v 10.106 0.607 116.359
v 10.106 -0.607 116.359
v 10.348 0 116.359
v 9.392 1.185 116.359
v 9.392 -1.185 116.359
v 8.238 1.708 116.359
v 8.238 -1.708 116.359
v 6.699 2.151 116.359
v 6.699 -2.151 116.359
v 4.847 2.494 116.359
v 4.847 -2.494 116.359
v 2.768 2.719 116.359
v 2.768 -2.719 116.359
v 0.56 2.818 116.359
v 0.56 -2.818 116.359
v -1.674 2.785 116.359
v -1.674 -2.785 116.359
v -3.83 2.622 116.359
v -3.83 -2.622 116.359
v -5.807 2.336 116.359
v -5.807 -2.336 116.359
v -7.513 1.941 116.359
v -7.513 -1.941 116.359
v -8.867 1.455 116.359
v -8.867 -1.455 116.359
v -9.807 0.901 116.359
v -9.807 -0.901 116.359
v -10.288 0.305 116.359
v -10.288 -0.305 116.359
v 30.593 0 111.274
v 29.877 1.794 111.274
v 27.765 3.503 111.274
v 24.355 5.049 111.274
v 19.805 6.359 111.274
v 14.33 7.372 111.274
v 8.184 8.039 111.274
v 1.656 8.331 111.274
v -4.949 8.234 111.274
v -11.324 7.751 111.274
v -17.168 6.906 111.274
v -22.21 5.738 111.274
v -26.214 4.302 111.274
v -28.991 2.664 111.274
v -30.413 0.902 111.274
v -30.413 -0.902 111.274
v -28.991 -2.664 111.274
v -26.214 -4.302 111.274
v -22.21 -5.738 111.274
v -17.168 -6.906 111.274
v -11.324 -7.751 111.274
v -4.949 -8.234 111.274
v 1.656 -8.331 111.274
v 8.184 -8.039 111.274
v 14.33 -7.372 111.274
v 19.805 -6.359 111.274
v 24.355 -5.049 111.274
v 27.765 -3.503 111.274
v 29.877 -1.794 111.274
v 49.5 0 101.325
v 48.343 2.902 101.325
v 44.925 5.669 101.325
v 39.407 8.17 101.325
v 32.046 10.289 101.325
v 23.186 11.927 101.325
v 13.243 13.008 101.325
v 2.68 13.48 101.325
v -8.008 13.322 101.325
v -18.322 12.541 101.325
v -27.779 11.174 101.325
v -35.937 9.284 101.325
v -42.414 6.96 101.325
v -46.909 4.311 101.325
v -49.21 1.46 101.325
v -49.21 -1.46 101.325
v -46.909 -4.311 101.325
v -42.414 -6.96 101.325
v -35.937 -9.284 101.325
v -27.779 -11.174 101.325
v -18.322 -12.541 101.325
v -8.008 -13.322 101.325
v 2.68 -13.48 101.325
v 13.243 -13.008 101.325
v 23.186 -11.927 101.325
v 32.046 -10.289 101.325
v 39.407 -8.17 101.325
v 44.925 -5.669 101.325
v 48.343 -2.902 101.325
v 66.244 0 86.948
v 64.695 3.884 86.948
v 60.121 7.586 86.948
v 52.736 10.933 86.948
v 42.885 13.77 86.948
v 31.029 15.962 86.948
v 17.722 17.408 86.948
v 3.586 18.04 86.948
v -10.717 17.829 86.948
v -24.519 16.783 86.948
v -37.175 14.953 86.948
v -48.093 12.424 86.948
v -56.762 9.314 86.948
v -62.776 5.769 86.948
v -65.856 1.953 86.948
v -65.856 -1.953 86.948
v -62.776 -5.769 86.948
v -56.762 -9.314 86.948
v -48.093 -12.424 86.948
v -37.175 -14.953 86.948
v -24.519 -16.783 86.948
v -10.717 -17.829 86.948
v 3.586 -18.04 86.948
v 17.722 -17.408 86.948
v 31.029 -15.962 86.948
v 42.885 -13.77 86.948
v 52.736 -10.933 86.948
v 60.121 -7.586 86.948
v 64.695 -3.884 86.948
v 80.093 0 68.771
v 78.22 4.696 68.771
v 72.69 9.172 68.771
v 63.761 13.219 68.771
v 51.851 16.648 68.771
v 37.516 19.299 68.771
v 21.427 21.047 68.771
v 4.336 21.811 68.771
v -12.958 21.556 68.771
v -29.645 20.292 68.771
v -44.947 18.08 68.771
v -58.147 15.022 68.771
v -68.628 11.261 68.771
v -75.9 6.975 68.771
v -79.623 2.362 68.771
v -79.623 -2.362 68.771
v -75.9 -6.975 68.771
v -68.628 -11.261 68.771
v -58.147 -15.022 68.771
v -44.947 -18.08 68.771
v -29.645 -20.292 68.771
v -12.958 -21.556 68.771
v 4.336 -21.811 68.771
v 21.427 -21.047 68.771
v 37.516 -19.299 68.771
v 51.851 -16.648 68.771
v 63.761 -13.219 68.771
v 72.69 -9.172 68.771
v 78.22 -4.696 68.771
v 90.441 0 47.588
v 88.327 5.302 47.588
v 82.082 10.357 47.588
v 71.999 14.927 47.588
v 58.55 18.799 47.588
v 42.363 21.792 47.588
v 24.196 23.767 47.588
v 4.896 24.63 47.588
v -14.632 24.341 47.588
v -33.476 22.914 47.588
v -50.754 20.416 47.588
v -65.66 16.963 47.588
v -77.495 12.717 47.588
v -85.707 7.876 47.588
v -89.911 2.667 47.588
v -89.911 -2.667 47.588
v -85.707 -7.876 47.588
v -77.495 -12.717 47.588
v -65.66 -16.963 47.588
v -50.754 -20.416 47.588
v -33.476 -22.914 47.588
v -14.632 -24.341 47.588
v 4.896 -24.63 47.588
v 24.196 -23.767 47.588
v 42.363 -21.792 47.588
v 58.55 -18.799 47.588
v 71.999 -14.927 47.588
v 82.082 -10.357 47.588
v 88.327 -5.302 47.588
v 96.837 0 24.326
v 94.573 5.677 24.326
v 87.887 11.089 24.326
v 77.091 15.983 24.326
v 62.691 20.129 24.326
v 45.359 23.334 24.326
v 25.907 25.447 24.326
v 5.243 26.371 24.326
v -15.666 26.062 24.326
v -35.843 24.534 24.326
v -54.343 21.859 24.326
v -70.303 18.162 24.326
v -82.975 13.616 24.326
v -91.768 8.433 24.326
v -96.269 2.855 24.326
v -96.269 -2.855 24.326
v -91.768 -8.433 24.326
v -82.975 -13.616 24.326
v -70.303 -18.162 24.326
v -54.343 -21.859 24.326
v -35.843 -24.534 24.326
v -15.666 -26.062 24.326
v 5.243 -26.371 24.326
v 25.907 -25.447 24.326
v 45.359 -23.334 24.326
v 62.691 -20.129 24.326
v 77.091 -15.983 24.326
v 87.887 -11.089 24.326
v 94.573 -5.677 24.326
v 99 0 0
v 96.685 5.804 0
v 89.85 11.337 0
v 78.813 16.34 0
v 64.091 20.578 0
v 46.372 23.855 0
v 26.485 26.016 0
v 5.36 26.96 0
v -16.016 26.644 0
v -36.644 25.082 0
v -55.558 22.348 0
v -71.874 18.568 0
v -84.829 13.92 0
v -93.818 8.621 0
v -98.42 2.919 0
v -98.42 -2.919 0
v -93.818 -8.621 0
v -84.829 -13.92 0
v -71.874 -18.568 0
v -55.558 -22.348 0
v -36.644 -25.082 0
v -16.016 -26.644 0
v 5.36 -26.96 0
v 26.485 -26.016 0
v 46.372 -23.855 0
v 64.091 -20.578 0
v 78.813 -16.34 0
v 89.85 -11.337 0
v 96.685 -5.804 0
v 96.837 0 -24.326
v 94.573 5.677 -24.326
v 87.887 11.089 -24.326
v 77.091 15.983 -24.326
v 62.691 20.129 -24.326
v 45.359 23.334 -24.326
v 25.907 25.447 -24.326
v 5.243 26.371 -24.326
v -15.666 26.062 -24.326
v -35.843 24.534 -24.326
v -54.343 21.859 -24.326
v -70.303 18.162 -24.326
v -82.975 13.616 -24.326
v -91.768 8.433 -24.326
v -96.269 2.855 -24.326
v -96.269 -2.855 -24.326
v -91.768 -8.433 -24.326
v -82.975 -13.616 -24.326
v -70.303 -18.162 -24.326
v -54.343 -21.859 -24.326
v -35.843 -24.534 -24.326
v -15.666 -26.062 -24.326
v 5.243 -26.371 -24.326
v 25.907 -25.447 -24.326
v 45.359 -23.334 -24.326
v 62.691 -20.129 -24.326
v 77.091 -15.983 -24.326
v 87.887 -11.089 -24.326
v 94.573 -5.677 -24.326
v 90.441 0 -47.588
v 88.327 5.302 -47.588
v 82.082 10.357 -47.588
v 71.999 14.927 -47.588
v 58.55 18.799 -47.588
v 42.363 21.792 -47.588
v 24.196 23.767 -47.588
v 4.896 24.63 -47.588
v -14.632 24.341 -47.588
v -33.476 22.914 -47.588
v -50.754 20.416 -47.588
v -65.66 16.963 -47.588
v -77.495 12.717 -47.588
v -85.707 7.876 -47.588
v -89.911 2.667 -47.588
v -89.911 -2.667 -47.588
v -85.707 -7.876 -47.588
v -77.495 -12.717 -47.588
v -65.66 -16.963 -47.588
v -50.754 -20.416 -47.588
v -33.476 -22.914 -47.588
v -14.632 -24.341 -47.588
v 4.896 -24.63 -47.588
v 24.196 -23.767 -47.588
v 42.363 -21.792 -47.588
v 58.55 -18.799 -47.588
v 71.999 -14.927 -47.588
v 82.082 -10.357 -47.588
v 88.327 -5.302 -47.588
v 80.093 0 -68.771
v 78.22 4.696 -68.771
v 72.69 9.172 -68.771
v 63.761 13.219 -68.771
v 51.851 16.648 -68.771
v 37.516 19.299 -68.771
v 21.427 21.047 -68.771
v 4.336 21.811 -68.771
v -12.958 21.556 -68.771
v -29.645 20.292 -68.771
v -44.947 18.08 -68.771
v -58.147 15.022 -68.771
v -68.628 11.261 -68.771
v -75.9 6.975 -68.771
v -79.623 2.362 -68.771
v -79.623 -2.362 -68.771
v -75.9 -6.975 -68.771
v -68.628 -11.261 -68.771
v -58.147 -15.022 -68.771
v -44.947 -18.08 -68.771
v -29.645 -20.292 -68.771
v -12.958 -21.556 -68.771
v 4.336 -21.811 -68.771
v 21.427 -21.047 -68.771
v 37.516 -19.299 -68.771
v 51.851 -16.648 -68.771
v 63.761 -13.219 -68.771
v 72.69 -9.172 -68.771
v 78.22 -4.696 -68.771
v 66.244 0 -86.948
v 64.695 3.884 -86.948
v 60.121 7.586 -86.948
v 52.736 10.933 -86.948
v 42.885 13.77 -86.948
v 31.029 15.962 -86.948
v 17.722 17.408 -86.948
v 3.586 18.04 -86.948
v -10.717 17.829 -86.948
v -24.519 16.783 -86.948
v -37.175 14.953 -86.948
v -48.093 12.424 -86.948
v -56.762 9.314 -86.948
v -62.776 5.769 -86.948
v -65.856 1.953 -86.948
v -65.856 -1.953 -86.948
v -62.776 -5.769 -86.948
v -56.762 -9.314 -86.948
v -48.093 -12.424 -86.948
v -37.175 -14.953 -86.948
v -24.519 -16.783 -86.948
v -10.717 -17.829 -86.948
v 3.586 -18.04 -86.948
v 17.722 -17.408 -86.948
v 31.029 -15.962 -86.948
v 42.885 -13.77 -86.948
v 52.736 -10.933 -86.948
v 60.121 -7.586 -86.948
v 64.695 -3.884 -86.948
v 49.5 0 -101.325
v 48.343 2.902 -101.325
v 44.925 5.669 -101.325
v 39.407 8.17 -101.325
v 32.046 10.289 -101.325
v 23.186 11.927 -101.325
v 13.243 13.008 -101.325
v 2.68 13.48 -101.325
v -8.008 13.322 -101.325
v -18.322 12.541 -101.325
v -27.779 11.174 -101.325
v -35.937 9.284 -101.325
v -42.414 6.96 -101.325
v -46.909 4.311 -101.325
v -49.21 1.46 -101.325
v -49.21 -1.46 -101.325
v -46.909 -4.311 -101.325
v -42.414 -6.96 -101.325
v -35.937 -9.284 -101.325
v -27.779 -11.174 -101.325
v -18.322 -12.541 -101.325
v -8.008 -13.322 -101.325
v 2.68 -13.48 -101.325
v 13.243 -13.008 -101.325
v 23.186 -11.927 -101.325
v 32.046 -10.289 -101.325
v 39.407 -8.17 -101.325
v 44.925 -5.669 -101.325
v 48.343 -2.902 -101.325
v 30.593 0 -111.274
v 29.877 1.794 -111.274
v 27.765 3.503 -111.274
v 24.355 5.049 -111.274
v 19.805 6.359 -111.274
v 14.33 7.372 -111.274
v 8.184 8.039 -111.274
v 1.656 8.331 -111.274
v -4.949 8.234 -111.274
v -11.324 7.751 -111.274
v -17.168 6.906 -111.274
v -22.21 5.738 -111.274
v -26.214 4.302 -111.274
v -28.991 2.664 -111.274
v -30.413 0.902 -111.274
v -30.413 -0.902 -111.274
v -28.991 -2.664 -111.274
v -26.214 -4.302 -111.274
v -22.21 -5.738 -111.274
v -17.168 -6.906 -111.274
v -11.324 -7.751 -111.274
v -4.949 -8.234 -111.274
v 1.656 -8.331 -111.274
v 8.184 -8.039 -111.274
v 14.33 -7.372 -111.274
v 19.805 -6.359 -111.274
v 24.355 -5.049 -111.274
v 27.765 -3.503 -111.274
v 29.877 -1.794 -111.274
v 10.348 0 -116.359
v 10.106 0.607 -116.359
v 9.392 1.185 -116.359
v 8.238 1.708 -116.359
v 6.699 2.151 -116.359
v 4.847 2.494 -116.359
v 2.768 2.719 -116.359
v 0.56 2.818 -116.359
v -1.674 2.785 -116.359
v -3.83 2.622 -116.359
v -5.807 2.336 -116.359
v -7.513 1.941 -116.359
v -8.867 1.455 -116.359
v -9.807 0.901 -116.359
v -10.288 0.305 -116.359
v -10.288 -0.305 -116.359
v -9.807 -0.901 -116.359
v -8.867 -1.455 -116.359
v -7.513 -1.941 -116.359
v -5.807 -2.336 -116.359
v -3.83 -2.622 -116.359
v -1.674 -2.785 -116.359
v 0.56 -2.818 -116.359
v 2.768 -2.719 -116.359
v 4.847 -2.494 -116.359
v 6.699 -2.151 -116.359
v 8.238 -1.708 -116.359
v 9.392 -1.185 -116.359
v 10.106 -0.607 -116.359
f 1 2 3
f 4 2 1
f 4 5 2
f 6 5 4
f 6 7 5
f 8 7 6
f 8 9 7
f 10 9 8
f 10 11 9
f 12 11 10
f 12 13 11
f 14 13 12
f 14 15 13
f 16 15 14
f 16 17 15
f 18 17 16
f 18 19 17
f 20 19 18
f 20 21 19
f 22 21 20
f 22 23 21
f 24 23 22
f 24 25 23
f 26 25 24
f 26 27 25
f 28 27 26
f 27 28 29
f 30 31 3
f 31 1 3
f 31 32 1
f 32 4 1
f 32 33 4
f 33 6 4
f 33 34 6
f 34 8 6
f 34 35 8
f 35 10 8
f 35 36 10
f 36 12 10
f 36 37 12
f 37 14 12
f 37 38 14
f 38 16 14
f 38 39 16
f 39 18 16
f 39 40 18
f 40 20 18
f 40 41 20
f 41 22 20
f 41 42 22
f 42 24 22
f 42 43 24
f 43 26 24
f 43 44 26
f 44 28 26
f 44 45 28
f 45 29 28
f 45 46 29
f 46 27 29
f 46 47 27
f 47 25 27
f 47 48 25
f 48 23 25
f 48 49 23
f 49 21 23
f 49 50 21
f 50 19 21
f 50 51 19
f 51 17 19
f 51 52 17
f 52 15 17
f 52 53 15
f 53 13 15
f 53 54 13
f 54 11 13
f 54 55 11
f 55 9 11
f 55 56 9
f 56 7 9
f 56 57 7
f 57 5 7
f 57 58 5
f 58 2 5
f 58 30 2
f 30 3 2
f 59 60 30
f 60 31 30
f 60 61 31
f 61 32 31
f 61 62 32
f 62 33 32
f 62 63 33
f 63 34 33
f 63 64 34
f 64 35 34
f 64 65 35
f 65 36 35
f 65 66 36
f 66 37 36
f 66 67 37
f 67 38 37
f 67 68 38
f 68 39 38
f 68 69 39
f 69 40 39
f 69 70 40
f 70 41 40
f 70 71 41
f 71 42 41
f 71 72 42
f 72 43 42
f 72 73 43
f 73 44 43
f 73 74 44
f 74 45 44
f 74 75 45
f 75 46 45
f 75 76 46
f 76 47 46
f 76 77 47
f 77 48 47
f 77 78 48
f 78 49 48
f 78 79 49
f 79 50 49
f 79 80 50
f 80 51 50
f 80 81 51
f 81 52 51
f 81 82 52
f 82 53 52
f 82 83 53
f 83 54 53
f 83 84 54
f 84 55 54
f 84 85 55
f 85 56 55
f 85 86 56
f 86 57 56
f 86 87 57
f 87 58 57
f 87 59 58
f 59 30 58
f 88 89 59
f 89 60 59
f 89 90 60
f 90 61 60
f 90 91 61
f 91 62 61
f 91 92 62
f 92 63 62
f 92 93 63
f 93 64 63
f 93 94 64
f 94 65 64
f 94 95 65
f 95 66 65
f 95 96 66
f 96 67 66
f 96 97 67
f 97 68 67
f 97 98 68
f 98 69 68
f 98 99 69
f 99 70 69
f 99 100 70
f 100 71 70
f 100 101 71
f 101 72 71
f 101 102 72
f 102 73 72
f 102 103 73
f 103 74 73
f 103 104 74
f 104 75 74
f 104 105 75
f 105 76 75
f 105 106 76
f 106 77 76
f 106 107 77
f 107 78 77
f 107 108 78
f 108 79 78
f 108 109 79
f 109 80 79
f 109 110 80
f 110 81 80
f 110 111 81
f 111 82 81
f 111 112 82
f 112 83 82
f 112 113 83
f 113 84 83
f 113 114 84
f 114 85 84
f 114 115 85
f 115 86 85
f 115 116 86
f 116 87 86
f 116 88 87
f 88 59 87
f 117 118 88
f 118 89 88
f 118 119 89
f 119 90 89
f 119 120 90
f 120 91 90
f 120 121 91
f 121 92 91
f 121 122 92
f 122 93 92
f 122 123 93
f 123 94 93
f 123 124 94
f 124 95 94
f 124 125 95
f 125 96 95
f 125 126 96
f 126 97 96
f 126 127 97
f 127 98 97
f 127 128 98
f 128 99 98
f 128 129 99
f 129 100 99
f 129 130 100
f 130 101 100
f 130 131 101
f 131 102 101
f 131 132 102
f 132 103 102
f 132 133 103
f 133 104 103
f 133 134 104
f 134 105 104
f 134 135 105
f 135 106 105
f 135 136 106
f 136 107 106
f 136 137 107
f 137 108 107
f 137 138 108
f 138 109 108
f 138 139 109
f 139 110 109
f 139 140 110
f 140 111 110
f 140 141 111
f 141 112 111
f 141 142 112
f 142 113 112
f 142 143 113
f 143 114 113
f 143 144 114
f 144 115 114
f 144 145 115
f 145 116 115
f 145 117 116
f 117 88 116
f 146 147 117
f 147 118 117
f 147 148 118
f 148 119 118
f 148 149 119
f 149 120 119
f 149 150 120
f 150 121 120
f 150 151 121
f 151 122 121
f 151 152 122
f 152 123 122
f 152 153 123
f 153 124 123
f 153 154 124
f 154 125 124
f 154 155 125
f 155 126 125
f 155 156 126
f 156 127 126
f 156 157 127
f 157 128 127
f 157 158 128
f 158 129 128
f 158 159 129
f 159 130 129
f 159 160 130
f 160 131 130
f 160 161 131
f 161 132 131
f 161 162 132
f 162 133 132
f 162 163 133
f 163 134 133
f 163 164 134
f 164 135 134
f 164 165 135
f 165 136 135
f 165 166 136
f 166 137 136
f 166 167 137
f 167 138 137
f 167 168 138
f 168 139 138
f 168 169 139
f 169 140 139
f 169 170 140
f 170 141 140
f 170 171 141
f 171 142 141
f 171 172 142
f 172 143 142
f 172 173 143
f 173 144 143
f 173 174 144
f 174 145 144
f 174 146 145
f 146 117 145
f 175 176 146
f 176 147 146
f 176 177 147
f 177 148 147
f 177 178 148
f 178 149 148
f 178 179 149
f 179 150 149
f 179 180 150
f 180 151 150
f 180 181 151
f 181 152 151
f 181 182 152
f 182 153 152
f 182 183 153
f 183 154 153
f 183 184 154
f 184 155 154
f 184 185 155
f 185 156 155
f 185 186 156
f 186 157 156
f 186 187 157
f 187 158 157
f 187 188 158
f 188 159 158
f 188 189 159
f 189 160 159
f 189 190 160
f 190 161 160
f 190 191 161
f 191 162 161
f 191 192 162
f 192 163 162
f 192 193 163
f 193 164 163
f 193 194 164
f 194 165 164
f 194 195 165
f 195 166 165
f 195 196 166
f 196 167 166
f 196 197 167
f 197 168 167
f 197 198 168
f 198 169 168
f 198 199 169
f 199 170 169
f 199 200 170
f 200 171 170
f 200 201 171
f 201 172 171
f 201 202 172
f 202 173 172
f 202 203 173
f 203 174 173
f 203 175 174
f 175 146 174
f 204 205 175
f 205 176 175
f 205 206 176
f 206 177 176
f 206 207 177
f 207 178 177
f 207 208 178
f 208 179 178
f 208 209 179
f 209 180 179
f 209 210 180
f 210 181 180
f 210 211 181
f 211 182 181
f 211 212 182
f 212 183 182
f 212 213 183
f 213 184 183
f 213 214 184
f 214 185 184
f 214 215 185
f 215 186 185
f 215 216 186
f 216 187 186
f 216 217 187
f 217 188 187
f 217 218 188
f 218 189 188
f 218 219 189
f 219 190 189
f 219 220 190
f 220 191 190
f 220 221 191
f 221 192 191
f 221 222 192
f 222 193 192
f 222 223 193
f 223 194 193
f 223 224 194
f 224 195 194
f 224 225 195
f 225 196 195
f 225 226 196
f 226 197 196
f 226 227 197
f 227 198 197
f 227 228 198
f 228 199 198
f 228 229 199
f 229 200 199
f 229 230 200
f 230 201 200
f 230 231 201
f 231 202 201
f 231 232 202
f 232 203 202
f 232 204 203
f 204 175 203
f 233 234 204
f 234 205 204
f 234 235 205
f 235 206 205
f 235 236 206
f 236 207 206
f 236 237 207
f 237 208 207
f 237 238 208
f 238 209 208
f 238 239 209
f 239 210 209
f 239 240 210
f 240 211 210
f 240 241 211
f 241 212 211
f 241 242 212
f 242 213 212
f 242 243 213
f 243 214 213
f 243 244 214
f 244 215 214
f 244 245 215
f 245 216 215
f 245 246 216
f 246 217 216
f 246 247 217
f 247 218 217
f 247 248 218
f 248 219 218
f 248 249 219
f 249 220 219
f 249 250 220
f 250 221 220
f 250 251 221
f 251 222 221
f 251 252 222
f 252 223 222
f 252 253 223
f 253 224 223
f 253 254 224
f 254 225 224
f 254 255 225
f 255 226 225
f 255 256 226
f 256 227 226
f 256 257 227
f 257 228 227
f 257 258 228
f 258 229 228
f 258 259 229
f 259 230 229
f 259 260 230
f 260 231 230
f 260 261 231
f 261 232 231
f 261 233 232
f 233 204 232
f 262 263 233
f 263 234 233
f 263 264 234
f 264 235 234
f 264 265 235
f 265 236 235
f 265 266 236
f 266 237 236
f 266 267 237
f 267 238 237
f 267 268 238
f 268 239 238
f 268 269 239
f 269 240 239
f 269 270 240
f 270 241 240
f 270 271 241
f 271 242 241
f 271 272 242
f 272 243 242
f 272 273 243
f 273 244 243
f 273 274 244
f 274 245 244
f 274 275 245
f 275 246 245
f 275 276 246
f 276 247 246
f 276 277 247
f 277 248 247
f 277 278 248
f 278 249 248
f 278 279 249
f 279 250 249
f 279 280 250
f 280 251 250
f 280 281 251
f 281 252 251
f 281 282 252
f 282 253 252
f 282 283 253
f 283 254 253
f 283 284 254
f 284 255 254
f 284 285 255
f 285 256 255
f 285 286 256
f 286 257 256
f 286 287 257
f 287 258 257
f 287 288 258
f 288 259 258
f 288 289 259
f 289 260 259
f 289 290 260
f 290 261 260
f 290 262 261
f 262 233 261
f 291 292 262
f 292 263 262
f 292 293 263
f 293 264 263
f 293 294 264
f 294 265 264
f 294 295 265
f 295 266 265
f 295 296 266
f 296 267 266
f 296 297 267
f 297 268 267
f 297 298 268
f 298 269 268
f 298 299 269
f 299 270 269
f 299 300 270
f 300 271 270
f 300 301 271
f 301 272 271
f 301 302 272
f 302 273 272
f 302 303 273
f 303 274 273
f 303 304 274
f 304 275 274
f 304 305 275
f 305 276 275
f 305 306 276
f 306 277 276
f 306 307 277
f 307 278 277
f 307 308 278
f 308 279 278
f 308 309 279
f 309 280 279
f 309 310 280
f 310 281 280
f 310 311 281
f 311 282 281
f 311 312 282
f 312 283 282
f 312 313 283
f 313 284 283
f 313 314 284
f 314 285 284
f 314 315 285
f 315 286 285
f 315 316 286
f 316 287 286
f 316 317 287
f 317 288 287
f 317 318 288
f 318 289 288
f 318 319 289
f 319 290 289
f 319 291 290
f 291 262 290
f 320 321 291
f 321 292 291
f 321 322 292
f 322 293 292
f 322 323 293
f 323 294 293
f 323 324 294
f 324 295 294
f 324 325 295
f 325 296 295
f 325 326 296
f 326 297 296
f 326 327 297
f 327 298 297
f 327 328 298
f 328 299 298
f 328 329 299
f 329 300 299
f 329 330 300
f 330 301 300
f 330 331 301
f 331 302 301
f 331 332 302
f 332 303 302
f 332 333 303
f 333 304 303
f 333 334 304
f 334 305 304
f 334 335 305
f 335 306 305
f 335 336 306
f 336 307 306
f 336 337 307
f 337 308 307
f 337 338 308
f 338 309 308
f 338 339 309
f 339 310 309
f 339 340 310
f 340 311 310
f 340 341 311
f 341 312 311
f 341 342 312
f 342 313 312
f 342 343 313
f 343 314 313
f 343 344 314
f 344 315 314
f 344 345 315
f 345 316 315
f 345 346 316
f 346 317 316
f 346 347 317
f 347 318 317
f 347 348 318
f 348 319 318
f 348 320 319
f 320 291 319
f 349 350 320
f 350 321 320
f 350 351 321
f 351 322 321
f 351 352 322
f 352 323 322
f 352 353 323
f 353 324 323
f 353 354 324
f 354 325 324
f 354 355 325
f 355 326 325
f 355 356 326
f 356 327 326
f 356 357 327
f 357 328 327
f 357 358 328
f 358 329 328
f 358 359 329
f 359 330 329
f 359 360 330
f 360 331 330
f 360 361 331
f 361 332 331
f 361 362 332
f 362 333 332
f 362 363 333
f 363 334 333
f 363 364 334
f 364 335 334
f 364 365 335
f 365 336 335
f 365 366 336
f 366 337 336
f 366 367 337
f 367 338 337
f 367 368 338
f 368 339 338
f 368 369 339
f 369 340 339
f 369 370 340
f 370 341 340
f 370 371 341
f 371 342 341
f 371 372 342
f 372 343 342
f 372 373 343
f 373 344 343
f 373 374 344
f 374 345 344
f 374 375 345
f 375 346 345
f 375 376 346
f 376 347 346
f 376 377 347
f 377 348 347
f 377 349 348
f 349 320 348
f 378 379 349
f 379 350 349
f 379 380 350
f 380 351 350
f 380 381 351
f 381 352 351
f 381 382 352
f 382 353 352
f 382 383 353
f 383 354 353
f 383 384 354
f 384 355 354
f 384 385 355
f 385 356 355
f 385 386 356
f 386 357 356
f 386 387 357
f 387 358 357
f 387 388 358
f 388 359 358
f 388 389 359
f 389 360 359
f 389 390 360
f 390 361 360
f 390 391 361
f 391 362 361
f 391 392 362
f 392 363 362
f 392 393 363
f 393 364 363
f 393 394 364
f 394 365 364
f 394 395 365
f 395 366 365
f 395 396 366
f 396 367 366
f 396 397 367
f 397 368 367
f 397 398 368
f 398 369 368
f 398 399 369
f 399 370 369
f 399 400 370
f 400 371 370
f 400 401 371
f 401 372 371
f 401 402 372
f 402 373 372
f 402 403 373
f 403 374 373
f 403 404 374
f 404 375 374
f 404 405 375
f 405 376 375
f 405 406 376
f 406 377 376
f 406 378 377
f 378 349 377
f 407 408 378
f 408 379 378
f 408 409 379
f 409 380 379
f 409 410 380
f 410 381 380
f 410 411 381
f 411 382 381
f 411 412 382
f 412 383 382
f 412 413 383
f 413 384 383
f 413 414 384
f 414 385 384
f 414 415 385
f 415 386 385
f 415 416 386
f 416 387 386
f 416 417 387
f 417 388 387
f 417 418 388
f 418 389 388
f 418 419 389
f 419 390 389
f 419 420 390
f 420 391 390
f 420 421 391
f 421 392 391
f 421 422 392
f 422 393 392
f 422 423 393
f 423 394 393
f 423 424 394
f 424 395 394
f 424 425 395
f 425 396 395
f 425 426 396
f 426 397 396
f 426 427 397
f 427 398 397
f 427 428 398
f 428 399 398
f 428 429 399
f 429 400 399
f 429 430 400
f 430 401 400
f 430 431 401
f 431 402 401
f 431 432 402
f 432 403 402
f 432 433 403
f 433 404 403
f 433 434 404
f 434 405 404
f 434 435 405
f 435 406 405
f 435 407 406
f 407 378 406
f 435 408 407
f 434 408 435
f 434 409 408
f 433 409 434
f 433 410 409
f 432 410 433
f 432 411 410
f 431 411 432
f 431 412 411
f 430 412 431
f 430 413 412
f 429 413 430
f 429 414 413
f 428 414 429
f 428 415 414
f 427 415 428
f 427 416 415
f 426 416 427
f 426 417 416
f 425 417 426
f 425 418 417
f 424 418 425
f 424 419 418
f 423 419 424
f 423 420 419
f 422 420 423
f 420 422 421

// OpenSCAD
// Generated by SolidPython 1.0.1 on 2020-07-29 00:46:49


scale(v = [11, 3, 13]) {
	sphere(r = 9);
}
/***********************************************
*********      SolidPython code:      **********
************************************************
 
# import packages: SolidPython
from solid import *
from solid.utils import *
from itertools import chain, combinations, permutations


class Resize:

    def __init__(self, scad_file):
        self.scad_file = scad_file
        #self.scad_file = import_scad(scad_file)
        # cone/cylinder param:
        self.r1 = 0
        self.r2 = 0
        self.h = 0
        # rectangular prism param:
        self.w = 0
        self.l = 0
        # ellipse param:
        self.r = 0

    # import OpenScad code (file name corresponds to shape)


    # classify shape + parameters
    def assign(self, param1, param2, param3):
        if self.scad_file == 'cone.scad':
            self.r1 = param1
            self.r2 = param2
            self.h = param3
        elif self.scad_file == 'cylinder.scad':
            self.r1 = param1
            self.r2 = param2
            self.h = param3
        elif self.scad_file == 'rectangularPrism.scad':
            self.h = param1
            self.l = param2
            self.w = param3
        else:
            self.r = param1
            self.h = param2

    # resize parameters
    def iterate(self):
        x = range(3, 20, 2)
        i = 1
        if self.scad_file == 'cone.scad':
            tempList = list(permutations(x, 2))
            for temp in tempList:
                param1 = temp[0]
                param2 = temp[1]
                filepath = 'produced_scad_files/' + 'cone' + str(param1) + '_' + str(param2) + '_' + '.scad'
                scad_render_to_file(cylinder(h=param1, r1=param2, r2=0), filepath)

        elif self.scad_file == 'cylinder.scad':
            tempList = list(permutations(x, 3))
            for temp in tempList:
                param1 = temp[0]
                param2 = temp[1]
                filepath = 'produced_scad_files/' + 'cylinder' + str(param1) + '_' + str(param2) + '_' + '.scad'
                scad_render_to_file(cylinder(h=param1, r1=param2, r2=param2), filepath)

        elif self.scad_file == 'rectangularPrism.scad':
            tempList = list(permutations(x, 3))
            for temp in tempList:
                param1 = temp[0]
                param2 = temp[1]
                param3 = temp[2]
                filepath = 'produced_scad_files/' + 'rectangularPrism' + str(param1) + '_' + str(param2) + '_' + str(
                    param3) + '.scad'
                scad_render_to_file(cube(size=(param1, param2, param3)), filepath)

        elif self.scad_file == 'ellipse.scad':
            tempList = list(permutations(x, 4))
            for temp in tempList:
                param1 = temp[0]
                param2 = temp[1]
                param3 = temp[2]
                param4 = temp[3]
                filepath = 'produced_scad_files/' + 'ellipse' + str(param1) + '_' + str(param2) + '_' + str(param3) + '_' + str(param4) + '.scad'
                scad_render_to_file(scale([param1, param2, param3])(sphere(r=param4)), filepath)

    def render_to_scadfile(self):
        scad_render_to_file(scad, 'example.scad') 
 
************************************************/
